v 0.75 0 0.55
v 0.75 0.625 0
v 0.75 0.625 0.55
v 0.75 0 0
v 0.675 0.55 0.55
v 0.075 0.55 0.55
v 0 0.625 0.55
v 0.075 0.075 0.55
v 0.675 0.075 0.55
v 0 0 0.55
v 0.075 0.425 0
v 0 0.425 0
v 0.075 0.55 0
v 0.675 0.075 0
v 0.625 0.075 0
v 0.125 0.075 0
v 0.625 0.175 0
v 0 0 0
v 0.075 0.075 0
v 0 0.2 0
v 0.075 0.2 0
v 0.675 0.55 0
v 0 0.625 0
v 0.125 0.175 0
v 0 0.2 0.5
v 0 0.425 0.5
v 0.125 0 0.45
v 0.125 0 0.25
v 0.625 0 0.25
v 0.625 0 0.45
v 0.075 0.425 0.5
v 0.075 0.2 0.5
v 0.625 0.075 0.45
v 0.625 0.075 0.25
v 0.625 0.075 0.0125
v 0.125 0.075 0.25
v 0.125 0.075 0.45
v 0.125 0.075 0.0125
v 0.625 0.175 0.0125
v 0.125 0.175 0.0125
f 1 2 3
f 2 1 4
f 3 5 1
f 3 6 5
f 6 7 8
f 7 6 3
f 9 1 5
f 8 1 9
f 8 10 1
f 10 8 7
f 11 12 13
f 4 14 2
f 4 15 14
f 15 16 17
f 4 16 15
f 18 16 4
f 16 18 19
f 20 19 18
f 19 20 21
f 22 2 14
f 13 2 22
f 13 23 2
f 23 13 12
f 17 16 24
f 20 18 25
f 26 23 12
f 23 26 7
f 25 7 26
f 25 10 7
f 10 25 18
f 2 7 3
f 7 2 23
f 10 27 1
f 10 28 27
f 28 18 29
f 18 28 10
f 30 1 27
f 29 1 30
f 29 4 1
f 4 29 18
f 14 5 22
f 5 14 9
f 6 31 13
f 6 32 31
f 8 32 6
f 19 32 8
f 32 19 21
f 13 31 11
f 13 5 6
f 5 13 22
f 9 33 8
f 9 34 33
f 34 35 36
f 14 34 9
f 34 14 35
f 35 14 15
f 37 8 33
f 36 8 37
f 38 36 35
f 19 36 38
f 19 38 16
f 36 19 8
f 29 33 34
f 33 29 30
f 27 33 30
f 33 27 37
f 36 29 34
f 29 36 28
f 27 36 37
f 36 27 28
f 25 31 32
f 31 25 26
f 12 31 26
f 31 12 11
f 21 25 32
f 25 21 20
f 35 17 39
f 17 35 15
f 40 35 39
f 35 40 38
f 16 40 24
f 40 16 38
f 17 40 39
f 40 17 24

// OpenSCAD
// Parametric variables for overall dimensions
outer_width = 0.75;
outer_depth = 0.625;
outer_height = 0.55;
wall_thickness = 0.075;

// Front cut parameters
front_cut_width = 0.5;
front_cut_margin = 0.125;
front_cut_z_min = 0.25;
front_cut_z_max = 0.45;
front_cut_depth = 0.075;

// Left cut parameters
left_cut_depth = 0.075;
left_cut_y_span = 0.225;
left_cut_y_margin = 0.2; // Front margin
left_cut_z_max = 0.5;

// Internal ledge parameters
ledge_length = 0.5;
ledge_width = 0.1;
ledge_margin = 0.125;
ledge_thickness = 0.0125;

// Small overlap for robust boolean operations (prevents Z-fighting)
eps = 0.01;

// Module defining the main hollow enclosure with wall cuts
module main_enclosure() {
    difference() {
        // Main solid outer body
        cube([outer_width, outer_depth, outer_height]);

        // Subtract the inner void to create an open-top, open-bottom hollow enclosure
        translate([wall_thickness, wall_thickness, -eps])
            cube([
                outer_width - 2 * wall_thickness,
                outer_depth - 2 * wall_thickness,
                outer_height + 2 * eps
            ]);

        // Remove the horizontal rectangular cut on the front wall
        translate([front_cut_margin, -eps, front_cut_z_min])
            cube([
                front_cut_width,
                front_cut_depth + eps,
                front_cut_z_max - front_cut_z_min
            ]);

        // Remove the vertical rectangular opening on the left side wall
        translate([-eps, left_cut_y_margin, -eps])
            cube([
                left_cut_depth + eps,
                left_cut_y_span,
                left_cut_z_max + eps
            ]);
    }
}

// Module defining the internal shallow ledge
module internal_ledge() {
    // Positioned along the front inside region, sitting at the base datum
    translate([ledge_margin, wall_thickness, 0])
        cube([ledge_length, ledge_width, ledge_thickness]);
}

// Final model construction
union() {
    main_enclosure();
    internal_ledge();
}
